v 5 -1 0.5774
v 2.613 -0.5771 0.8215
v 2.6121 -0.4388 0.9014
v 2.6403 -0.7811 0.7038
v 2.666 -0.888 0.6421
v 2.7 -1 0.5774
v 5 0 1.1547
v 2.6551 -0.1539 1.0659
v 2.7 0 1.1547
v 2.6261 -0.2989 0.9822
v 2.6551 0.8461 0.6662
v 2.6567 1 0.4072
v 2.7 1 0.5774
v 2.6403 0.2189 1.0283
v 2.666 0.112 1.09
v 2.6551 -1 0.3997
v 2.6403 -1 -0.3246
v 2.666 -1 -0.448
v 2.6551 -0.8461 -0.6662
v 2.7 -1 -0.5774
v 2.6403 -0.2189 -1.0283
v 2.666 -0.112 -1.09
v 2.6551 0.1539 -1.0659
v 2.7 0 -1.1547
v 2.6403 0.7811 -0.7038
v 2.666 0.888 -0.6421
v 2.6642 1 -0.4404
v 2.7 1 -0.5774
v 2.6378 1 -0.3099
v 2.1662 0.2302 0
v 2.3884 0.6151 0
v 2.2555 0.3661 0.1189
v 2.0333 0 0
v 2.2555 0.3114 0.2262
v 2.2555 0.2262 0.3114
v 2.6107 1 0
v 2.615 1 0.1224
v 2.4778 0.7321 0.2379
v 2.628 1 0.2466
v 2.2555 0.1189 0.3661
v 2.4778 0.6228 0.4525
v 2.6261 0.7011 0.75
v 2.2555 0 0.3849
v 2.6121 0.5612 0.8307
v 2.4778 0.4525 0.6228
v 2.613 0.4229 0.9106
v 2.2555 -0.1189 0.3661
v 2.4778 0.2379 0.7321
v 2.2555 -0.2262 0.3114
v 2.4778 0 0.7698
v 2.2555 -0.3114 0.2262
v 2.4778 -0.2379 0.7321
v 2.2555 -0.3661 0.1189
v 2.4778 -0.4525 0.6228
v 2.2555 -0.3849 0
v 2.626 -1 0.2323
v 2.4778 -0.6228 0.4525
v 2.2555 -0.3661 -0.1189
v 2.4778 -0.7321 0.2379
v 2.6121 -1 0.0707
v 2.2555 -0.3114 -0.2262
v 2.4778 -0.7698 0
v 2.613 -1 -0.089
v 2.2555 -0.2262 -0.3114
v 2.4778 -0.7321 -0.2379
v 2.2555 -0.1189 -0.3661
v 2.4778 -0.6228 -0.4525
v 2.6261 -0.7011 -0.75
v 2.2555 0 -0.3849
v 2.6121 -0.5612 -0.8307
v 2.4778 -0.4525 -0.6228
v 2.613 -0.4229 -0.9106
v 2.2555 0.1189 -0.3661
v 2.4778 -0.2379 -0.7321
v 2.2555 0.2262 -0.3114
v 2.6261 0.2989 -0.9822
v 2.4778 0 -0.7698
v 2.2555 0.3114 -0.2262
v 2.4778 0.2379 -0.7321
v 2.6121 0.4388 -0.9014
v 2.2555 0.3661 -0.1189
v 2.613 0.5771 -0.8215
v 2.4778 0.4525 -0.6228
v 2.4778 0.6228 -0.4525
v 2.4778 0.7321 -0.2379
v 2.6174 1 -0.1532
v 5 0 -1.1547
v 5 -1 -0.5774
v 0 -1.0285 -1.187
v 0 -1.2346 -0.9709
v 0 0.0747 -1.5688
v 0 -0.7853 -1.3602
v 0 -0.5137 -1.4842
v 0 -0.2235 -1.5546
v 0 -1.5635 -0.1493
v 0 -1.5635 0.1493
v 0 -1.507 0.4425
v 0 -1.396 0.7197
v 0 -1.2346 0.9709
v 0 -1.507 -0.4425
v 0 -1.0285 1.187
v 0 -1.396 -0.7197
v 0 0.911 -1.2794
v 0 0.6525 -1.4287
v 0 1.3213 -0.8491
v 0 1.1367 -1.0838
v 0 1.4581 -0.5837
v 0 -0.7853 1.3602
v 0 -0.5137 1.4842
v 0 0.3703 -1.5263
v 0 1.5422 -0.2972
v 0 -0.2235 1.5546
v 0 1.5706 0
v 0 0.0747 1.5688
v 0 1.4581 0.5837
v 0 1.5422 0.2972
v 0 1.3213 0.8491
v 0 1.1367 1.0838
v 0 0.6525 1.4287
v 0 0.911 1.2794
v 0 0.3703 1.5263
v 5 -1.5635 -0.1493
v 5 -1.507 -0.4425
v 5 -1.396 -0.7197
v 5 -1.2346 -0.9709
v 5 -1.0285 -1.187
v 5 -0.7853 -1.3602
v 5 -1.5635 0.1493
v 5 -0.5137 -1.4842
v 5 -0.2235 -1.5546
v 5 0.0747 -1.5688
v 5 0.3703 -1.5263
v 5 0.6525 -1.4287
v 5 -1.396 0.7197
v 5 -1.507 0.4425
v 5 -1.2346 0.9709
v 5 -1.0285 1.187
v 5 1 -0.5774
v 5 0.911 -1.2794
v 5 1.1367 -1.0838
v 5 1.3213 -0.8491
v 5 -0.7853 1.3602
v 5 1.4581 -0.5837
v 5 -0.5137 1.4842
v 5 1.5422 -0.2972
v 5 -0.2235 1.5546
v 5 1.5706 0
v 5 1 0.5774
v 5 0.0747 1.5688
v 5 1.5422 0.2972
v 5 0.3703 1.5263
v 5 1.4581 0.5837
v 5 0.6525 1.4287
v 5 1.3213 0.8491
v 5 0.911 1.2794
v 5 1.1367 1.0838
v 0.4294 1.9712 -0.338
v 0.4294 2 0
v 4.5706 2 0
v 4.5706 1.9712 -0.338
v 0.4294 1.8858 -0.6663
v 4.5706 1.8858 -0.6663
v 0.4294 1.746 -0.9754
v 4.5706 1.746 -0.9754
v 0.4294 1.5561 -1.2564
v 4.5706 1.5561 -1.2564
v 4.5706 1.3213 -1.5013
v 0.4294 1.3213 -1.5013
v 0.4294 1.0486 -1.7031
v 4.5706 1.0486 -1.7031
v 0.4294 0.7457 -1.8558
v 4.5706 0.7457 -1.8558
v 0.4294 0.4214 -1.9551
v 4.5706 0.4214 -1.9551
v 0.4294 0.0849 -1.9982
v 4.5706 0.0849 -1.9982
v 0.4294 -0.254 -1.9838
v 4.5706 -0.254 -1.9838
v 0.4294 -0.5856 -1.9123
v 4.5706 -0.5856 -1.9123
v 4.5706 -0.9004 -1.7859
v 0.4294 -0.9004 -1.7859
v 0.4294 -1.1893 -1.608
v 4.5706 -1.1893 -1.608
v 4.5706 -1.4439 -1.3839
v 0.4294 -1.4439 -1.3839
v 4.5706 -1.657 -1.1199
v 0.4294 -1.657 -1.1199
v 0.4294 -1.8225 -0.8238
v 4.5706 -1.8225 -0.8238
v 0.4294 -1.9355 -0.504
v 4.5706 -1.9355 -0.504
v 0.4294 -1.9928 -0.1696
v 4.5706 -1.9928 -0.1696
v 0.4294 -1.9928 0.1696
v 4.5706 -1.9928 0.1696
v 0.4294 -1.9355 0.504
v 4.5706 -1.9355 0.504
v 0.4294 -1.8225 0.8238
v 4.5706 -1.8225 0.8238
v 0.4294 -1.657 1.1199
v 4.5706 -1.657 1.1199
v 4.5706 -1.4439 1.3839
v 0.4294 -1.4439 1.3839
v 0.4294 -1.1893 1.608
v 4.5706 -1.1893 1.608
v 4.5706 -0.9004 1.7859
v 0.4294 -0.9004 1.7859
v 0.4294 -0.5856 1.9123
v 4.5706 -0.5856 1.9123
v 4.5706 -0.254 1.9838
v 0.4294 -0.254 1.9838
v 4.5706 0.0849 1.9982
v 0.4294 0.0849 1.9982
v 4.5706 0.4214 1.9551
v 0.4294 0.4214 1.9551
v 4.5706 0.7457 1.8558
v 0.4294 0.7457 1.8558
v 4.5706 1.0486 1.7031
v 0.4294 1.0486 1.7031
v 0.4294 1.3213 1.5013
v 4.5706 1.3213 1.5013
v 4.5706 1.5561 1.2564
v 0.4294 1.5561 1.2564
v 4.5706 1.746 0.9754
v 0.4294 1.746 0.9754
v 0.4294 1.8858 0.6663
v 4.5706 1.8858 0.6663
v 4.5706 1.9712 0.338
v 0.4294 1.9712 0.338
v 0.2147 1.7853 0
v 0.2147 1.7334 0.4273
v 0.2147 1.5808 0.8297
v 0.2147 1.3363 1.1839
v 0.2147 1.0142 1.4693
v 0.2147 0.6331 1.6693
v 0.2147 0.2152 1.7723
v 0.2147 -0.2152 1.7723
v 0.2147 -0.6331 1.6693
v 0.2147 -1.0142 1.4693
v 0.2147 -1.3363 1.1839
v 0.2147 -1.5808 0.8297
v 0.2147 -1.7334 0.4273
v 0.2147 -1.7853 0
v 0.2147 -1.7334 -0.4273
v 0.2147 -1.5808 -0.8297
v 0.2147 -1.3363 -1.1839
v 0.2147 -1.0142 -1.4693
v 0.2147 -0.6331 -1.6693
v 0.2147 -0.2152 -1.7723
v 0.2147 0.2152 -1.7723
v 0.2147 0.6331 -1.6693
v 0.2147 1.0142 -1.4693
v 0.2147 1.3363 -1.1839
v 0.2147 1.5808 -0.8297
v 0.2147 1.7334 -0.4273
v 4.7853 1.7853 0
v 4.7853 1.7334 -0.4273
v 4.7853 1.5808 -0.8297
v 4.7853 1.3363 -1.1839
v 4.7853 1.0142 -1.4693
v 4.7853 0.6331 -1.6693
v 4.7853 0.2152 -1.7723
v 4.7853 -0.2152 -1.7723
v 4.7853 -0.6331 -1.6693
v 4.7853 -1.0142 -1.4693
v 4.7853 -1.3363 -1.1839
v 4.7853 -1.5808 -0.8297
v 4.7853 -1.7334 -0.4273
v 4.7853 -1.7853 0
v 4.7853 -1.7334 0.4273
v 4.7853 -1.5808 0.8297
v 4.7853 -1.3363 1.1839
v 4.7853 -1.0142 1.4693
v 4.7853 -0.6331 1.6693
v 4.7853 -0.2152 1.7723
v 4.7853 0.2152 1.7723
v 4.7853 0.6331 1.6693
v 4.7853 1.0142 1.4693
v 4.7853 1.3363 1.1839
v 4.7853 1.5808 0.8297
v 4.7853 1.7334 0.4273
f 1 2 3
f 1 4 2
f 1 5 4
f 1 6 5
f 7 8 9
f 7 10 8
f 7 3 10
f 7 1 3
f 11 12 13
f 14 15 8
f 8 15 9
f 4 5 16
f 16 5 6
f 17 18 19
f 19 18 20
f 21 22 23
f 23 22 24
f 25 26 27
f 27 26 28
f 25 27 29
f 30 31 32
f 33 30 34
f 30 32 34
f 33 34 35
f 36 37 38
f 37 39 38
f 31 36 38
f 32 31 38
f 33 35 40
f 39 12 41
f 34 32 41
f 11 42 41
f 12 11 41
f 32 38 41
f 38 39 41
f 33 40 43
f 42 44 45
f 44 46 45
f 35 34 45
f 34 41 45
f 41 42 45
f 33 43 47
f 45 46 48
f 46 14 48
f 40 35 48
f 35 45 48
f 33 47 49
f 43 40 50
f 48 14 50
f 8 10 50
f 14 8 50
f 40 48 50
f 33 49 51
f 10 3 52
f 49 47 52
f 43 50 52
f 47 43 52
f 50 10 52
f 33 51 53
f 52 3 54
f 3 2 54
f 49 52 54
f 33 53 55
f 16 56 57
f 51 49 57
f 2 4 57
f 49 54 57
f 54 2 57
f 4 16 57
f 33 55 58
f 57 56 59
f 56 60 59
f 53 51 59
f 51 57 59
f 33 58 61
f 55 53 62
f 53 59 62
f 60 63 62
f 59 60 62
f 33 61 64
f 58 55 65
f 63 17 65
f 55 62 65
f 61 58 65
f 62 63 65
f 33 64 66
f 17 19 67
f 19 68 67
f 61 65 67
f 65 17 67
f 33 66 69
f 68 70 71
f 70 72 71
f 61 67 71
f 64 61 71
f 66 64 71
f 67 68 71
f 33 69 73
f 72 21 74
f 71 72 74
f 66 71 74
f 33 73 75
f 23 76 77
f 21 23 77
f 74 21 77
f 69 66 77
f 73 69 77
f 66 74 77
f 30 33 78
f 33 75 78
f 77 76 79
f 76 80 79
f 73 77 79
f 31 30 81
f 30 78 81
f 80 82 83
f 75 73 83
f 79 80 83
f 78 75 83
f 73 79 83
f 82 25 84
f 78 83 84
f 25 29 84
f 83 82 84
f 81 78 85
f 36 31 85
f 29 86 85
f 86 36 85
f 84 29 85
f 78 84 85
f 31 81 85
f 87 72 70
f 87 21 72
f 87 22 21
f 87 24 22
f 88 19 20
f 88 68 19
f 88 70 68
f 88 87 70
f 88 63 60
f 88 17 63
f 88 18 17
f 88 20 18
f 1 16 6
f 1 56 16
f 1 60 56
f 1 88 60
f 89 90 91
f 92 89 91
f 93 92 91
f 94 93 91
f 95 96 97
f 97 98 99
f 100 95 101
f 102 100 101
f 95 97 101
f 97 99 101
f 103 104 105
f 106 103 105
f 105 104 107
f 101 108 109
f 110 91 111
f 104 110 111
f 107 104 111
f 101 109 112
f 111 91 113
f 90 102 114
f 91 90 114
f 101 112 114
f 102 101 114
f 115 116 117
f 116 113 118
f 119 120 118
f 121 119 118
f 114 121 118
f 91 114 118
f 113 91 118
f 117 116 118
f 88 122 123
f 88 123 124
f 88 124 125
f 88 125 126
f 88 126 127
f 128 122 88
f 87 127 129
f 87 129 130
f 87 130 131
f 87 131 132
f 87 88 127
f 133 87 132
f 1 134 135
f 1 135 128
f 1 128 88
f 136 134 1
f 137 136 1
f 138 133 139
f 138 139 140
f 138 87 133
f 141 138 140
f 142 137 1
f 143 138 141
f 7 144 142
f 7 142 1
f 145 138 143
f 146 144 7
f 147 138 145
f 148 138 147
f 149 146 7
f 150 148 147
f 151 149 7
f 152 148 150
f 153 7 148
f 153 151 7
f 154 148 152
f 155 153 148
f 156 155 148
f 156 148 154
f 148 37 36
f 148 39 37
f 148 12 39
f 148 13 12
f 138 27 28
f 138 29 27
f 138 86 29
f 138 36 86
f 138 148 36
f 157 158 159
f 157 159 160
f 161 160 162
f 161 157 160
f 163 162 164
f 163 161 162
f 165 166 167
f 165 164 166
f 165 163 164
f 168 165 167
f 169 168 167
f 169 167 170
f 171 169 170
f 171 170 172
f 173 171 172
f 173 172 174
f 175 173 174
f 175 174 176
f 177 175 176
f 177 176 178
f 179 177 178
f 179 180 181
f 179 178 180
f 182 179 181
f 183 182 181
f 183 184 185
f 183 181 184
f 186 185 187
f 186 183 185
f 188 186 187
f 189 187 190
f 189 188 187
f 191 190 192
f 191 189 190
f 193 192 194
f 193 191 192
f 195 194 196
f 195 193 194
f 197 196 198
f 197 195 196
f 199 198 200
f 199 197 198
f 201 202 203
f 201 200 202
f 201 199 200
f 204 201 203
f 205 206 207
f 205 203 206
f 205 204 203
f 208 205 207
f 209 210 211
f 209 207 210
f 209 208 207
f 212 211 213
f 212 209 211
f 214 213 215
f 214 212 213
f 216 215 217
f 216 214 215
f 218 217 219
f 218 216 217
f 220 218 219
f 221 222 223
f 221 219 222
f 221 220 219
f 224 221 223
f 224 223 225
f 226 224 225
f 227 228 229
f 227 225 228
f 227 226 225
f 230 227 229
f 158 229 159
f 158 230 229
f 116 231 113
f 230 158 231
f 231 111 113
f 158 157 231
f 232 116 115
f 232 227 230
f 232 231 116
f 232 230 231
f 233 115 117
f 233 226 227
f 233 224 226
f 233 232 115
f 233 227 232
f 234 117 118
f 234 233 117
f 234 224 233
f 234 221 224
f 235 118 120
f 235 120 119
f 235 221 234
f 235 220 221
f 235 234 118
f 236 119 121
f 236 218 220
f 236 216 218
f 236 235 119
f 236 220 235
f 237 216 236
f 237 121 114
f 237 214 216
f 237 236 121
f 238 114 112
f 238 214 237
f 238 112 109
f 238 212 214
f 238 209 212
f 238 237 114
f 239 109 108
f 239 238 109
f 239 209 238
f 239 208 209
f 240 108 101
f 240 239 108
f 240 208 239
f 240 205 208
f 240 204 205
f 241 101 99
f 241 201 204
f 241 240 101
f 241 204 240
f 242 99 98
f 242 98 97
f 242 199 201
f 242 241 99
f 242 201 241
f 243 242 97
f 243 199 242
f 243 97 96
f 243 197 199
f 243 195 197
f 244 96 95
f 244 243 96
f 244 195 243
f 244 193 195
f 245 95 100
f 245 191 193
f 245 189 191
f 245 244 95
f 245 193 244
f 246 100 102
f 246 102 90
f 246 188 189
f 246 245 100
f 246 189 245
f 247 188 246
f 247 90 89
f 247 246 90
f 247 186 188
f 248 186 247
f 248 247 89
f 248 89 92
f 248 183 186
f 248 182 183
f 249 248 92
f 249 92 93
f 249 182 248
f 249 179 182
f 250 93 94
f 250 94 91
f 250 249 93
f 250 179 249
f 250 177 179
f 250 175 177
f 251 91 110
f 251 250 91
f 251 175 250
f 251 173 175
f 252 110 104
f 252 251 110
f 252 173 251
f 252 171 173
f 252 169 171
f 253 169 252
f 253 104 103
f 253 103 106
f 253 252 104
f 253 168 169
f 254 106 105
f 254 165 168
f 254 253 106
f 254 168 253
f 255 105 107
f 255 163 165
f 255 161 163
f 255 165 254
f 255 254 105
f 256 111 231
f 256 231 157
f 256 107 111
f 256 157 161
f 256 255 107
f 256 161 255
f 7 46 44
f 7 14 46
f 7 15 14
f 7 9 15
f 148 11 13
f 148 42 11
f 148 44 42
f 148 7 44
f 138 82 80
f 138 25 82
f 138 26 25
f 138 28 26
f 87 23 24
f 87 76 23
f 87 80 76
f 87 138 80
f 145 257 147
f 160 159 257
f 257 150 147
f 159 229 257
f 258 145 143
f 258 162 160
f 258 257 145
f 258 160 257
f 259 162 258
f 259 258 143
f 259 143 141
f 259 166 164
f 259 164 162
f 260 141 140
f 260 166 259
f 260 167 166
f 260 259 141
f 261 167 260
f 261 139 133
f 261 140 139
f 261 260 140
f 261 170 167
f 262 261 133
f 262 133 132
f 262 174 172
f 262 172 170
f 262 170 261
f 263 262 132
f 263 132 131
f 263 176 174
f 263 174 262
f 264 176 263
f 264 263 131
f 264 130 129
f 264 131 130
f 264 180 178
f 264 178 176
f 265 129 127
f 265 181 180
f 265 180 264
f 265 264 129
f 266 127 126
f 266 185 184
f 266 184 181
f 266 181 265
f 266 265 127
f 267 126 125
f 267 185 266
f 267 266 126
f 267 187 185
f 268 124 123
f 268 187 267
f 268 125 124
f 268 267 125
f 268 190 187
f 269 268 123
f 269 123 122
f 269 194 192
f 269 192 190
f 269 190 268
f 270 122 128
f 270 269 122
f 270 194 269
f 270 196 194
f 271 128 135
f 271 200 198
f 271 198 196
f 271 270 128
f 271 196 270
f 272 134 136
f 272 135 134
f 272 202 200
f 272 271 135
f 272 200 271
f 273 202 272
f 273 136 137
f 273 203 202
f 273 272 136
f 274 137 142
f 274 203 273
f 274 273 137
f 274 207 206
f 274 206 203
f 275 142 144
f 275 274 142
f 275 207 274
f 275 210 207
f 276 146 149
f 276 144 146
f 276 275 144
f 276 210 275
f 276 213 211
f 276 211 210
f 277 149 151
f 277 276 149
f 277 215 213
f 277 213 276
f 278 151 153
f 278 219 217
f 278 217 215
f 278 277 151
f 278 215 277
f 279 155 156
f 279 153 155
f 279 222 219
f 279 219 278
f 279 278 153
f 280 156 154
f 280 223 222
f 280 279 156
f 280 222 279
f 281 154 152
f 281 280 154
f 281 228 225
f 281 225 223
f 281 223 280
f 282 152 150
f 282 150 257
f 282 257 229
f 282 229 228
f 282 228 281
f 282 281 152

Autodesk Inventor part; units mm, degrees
ref_plane "YZ Plane" through (0, 0, 0) normal (1, 0, 0) x (0, 1, 0)
ref_plane "XZ Plane" through (0, 0, 0) normal (0, 1, 0) x (-1, 0, 0)
sketch "Sketch1" plane through (0, 0, 0) normal (0, 0, 1) x (1, 0, 0)
  line L0 (0, 0) -> (2.0333, 0)
  line L1 (5, 1.1547) -> (5, 2)
  line L2 (5, 2) -> (0, 2)
  line L3 (5, 1.1547) -> (2.7, 1.1547)
  line L4 (2.7, 1.1547) -> (2.0333, 0)
  line L5 (0, -0.4) -> (0, 2.4) projected
  line L6 (0, 2) -> (0, 0)
  dimension "d0" = 2.3
  dimension "d1" = 60
  dimension "d2" = 4
  dimension "d3" = 2.3094
  dimension "d5" = 5
revolve "Body" add sketch "Sketch1" angle 360 about axis through (0, 0, 0) along (1, 0, 0)
chamfer "Chamfer1" distance 0.4294 angle 45 1 edges at (5, -2, 0) measured on face at (5, 1.6877, -0.2517)
sketch "Sketch2" plane through (5, 0, 0) normal (1, 0, 0) x (0, 0, -1)
  circle A0 centre (0, 0) radius 1.1547 projected
  line L0 (-0.5774, 1) -> (0.5774, 1)
  line L1 (0.5774, 1) -> (1.1547, 0)
  line L2 (1.1547, 0) -> (0.5774, -1)
  line L3 (0.5774, -1) -> (-0.5774, -1)
  line L4 (-0.5774, -1) -> (-1.1547, 0)
  line L5 (-1.1547, 0) -> (-0.5774, 1)
extrude "Slot" add sketch "Sketch2" against normal up to next contours L1 A0 | A0 L2 | L0 A0 | A0 L3 | L5 A0 | A0 L4
thread "Thread" size "M4x0.7" class "6g" standard "ANSI Metric M Profile" length 5
chamfer "Chamfer2" distance 0.4294 angle 45 1 edges at (0, -2, 0) measured on face at (1.5235, 1.9741, -0.3208)
ref_plane "Work Plane1" through (2.5, 0, 0) normal (0, 0.5, 0.866) x (1, 0, 0)
equation "\"d0\" = INTI"
equation "\"d2\" = NND"
equation "\"d3\" = 1.1547 * SW"
equation "\"d5\" = NLG"
equation "\"d7\" = -0.5 * GD1 + 0.5 * NND"
equation "\"d8\" = FAWI"
equation "\"d29\" = -0.5 * GD1 + 0.5 * NND"
equation "\"d11\" = NLG"
equation "\"d13\" = -0.5 * GD1 + 0.5 * NND"
equation "\"d14\" = FAWI"
equation "\"d30\" = -0.5 * GD1 + 0.5 * NND"
equation "\"NND\" = 4"
equation "\"NLG\" = 5"
equation "\"INTI\" = 2.3"
equation "\"FAWI\" = 45deg"
equation "\"SW\" = 2"
equation "\"GD1\" = THREADDIA - 1.2269 * PTC"
equation "\"FAWI1\" = 45deg"
equation "\"GUL\" = 0.61345 * PTC"
equation "\"SPD\" = 2.5"
equation "\"TOA\" = 30deg"
equation "\"THREADDIA\" = 4"
equation "\"PTC\" = 0.7"
equation "\"GAL\" = 0.61345 * PTC"
equation "\"E0\" = 1.155 * SW"
properties part number "11-3204" material "Steel, Mild"
